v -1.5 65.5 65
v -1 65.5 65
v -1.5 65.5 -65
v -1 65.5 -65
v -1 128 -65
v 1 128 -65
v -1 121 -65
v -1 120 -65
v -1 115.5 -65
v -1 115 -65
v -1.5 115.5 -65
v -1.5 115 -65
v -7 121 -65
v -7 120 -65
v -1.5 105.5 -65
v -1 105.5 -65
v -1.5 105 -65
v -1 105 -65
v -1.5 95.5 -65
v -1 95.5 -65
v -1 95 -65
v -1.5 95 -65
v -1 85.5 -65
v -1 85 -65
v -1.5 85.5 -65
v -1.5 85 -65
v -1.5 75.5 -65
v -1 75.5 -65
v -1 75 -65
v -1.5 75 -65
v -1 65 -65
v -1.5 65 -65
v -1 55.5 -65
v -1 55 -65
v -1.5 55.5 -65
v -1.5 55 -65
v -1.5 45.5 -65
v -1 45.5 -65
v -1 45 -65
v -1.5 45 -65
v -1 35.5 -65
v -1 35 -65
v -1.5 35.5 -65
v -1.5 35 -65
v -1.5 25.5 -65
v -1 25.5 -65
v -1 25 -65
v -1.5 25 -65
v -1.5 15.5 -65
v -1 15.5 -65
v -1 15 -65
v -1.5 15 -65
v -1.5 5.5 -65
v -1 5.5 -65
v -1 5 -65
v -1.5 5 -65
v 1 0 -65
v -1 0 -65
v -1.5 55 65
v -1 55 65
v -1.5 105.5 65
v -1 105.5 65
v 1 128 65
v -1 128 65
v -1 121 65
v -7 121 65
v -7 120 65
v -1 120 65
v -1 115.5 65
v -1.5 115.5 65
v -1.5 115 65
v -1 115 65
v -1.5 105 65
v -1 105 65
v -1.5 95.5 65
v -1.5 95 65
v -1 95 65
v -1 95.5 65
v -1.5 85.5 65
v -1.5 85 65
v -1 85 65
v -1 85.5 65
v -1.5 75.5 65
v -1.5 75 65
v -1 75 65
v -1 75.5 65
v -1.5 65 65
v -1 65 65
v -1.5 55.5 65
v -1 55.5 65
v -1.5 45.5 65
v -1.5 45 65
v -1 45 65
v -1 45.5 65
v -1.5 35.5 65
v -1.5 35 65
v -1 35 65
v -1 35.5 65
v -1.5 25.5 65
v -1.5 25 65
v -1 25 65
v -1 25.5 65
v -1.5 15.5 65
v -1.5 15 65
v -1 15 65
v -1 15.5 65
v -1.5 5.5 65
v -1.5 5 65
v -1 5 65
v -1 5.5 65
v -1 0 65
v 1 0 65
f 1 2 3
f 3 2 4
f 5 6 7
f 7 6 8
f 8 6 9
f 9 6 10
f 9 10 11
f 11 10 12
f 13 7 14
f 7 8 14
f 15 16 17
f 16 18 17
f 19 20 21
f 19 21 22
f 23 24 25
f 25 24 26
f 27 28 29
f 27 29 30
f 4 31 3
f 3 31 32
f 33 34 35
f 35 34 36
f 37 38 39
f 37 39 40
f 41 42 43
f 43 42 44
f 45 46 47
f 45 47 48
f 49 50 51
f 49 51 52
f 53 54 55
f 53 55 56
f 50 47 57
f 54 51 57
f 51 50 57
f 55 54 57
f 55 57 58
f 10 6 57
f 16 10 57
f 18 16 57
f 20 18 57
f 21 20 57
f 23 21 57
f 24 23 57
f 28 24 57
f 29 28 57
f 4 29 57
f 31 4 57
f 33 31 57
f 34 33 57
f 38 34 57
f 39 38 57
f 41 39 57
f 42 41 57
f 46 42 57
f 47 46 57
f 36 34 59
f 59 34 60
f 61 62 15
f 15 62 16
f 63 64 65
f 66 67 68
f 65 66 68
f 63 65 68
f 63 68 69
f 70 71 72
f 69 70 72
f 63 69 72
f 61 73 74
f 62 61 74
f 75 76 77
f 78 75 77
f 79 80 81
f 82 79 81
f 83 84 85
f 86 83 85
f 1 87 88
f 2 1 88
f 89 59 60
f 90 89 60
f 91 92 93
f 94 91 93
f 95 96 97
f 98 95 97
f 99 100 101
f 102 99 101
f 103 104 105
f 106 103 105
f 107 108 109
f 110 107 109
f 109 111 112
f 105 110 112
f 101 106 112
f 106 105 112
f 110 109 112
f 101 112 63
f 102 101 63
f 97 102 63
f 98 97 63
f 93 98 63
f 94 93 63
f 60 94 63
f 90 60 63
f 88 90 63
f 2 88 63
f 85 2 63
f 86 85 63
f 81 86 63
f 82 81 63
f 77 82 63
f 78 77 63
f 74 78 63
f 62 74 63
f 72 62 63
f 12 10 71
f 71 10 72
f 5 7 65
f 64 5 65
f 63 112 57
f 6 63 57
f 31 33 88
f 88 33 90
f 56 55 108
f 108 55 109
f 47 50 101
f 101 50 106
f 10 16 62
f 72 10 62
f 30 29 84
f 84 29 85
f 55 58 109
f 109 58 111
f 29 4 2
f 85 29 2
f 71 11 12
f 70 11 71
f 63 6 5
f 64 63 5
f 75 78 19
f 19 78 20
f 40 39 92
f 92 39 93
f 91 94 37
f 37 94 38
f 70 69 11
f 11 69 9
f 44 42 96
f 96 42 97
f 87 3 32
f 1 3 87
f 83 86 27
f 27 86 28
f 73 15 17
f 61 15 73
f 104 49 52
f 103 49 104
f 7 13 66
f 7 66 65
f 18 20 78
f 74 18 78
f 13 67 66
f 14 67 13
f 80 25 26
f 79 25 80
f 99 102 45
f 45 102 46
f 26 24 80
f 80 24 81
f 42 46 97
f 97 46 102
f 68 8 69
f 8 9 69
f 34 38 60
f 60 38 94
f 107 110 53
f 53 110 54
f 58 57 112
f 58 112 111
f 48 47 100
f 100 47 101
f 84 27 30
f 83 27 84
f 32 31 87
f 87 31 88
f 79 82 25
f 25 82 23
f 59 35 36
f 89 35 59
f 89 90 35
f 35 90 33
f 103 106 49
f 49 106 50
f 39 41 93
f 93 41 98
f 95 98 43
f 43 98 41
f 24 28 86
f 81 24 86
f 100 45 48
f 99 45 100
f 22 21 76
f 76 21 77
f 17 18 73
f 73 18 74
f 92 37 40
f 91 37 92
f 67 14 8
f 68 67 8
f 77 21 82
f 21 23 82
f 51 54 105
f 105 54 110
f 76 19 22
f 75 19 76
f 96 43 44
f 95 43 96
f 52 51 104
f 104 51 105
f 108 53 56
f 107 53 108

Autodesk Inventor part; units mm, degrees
ref_plane "YZ Plane" through (0, 0, 0) normal (1, 0, 0) x (0, 1, 0)
ref_plane "XZ Plane" through (0, 0, 0) normal (0, 1, 0) x (-1, 0, 0)
sketch "Sketch1" plane through (0, 0, 0) normal (0, 1, 0) x (-1, 0, 0)
  line L0 (1, 65) -> (-1, 65)
  line L1 (-1, 65) -> (-1, -65)
  line L2 (-1, -65) -> (1, -65)
  line L3 (1, -65) -> (1, 65)
  line L4 (1, 65) -> (-1, -65) construction
  point P0 (0, 0)
  point P1 (0, 0)
  dimension "d0" = 130
  dimension "d1" = 2
extrude "Extrusion1" add sketch "Sketch1" along normal blind 128
ref_plane "Work Plane1" through (0, 120, 0) normal (0, 1, 0) x (1, 0, 0)
sketch "Sketch2" plane through (0, 120, 0) normal (0, 1, 0) x (1, 0, 0)
  line L0 (-1, -65) -> (1, -65) projected
  line L1 (1, 65) -> (-1, 65) projected
  line L2 (-1, -65) -> (-7, -65)
  line L3 (-7, -65) -> (-7, 65)
  line L4 (-7, 65) -> (-1, 65)
  line L5 (-1, 65) -> (-1, -65)
  point P0 (0, 0)
  dimension "d5" = 6
extrude "Extrusion2" add sketch "Sketch2" along normal blind 1
sketch "Sketch3" plane through (-1, 0, -65) normal (-1, 0, 0) x (0, 0, 1)
  line L0 (0, 5) -> (130, 5)
  line L1 (130, 5) -> (130, 5.5)
  line L2 (130, 5.5) -> (0, 5.5)
  line L3 (0, 5.5) -> (0, 5)
  line L4 (0, 0) -> (0, 120) projected
  line L5 (130, 0) -> (130, 120) projected
  line L6 (0, 0) -> (130, 0) projected
  line L7 (0, 15) -> (130, 15)
  line L8 (130, 15) -> (130, 15.5)
  line L9 (130, 15.5) -> (0, 15.5)
  line L10 (0, 15.5) -> (0, 15)
  line L11 (0, 25) -> (130, 25)
  line L12 (130, 25) -> (130, 25.5)
  line L13 (130, 25.5) -> (0, 25.5)
  line L14 (0, 25.5) -> (0, 25)
  line L15 (0, 35) -> (130, 35)
  line L16 (130, 35) -> (130, 35.5)
  line L17 (130, 35.5) -> (0, 35.5)
  line L18 (0, 35.5) -> (0, 35)
  line L19 (0, 45) -> (130, 45)
  line L20 (130, 45) -> (130, 45.5)
  line L21 (130, 45.5) -> (0, 45.5)
  line L22 (0, 45.5) -> (0, 45)
  line L23 (0, 55) -> (130, 55)
  line L24 (130, 55) -> (130, 55.5)
  line L25 (130, 55.5) -> (0, 55.5)
  line L26 (0, 55.5) -> (0, 55)
  line L27 (0, 65) -> (130, 65)
  line L28 (130, 65) -> (130, 65.5)
  line L29 (130, 65.5) -> (0, 65.5)
  line L30 (0, 65.5) -> (0, 65)
  line L31 (0, 75) -> (130, 75)
  line L32 (130, 75) -> (130, 75.5)
  line L33 (130, 75.5) -> (0, 75.5)
  line L34 (0, 75.5) -> (0, 75)
  line L35 (0, 85) -> (130, 85)
  line L36 (130, 85) -> (130, 85.5)
  line L37 (130, 85.5) -> (0, 85.5)
  line L38 (0, 85.5) -> (0, 85)
  line L39 (0, 95) -> (130, 95)
  line L40 (130, 95) -> (130, 95.5)
  line L41 (130, 95.5) -> (0, 95.5)
  line L42 (0, 95.5) -> (0, 95)
  line L43 (0, 105) -> (130, 105)
  line L44 (130, 105) -> (130, 105.5)
  line L45 (130, 105.5) -> (0, 105.5)
  line L46 (0, 105.5) -> (0, 105)
  line L47 (0, 115) -> (130, 115)
  line L48 (130, 115) -> (130, 115.5)
  line L49 (130, 115.5) -> (0, 115.5)
  line L50 (0, 115.5) -> (0, 115)
  point P0 (65, 0)
  dimension "d8" = 0.5
  dimension "d9" = 5
  dimension "d12" = 10
extrude "Extrusion3" add sketch "Sketch3" along normal blind 0.5 contours L3 L2 L1 L0 | L4 L9 L5 L7 | L4 L13 L5 L11 | L4 L17 L5 L15 | L4 L21 L5 L19 | L4 L25 L5 L23 | L4 L29 L5 L27 | L4 L33 L5 L31 | L4 L37 L5 L35 | L4 L41 L5 L39 | L4 L45 L5 L43 | L4 L49 L5 L47
properties part number "Platina forntal interna" material "Stainless Steel"
